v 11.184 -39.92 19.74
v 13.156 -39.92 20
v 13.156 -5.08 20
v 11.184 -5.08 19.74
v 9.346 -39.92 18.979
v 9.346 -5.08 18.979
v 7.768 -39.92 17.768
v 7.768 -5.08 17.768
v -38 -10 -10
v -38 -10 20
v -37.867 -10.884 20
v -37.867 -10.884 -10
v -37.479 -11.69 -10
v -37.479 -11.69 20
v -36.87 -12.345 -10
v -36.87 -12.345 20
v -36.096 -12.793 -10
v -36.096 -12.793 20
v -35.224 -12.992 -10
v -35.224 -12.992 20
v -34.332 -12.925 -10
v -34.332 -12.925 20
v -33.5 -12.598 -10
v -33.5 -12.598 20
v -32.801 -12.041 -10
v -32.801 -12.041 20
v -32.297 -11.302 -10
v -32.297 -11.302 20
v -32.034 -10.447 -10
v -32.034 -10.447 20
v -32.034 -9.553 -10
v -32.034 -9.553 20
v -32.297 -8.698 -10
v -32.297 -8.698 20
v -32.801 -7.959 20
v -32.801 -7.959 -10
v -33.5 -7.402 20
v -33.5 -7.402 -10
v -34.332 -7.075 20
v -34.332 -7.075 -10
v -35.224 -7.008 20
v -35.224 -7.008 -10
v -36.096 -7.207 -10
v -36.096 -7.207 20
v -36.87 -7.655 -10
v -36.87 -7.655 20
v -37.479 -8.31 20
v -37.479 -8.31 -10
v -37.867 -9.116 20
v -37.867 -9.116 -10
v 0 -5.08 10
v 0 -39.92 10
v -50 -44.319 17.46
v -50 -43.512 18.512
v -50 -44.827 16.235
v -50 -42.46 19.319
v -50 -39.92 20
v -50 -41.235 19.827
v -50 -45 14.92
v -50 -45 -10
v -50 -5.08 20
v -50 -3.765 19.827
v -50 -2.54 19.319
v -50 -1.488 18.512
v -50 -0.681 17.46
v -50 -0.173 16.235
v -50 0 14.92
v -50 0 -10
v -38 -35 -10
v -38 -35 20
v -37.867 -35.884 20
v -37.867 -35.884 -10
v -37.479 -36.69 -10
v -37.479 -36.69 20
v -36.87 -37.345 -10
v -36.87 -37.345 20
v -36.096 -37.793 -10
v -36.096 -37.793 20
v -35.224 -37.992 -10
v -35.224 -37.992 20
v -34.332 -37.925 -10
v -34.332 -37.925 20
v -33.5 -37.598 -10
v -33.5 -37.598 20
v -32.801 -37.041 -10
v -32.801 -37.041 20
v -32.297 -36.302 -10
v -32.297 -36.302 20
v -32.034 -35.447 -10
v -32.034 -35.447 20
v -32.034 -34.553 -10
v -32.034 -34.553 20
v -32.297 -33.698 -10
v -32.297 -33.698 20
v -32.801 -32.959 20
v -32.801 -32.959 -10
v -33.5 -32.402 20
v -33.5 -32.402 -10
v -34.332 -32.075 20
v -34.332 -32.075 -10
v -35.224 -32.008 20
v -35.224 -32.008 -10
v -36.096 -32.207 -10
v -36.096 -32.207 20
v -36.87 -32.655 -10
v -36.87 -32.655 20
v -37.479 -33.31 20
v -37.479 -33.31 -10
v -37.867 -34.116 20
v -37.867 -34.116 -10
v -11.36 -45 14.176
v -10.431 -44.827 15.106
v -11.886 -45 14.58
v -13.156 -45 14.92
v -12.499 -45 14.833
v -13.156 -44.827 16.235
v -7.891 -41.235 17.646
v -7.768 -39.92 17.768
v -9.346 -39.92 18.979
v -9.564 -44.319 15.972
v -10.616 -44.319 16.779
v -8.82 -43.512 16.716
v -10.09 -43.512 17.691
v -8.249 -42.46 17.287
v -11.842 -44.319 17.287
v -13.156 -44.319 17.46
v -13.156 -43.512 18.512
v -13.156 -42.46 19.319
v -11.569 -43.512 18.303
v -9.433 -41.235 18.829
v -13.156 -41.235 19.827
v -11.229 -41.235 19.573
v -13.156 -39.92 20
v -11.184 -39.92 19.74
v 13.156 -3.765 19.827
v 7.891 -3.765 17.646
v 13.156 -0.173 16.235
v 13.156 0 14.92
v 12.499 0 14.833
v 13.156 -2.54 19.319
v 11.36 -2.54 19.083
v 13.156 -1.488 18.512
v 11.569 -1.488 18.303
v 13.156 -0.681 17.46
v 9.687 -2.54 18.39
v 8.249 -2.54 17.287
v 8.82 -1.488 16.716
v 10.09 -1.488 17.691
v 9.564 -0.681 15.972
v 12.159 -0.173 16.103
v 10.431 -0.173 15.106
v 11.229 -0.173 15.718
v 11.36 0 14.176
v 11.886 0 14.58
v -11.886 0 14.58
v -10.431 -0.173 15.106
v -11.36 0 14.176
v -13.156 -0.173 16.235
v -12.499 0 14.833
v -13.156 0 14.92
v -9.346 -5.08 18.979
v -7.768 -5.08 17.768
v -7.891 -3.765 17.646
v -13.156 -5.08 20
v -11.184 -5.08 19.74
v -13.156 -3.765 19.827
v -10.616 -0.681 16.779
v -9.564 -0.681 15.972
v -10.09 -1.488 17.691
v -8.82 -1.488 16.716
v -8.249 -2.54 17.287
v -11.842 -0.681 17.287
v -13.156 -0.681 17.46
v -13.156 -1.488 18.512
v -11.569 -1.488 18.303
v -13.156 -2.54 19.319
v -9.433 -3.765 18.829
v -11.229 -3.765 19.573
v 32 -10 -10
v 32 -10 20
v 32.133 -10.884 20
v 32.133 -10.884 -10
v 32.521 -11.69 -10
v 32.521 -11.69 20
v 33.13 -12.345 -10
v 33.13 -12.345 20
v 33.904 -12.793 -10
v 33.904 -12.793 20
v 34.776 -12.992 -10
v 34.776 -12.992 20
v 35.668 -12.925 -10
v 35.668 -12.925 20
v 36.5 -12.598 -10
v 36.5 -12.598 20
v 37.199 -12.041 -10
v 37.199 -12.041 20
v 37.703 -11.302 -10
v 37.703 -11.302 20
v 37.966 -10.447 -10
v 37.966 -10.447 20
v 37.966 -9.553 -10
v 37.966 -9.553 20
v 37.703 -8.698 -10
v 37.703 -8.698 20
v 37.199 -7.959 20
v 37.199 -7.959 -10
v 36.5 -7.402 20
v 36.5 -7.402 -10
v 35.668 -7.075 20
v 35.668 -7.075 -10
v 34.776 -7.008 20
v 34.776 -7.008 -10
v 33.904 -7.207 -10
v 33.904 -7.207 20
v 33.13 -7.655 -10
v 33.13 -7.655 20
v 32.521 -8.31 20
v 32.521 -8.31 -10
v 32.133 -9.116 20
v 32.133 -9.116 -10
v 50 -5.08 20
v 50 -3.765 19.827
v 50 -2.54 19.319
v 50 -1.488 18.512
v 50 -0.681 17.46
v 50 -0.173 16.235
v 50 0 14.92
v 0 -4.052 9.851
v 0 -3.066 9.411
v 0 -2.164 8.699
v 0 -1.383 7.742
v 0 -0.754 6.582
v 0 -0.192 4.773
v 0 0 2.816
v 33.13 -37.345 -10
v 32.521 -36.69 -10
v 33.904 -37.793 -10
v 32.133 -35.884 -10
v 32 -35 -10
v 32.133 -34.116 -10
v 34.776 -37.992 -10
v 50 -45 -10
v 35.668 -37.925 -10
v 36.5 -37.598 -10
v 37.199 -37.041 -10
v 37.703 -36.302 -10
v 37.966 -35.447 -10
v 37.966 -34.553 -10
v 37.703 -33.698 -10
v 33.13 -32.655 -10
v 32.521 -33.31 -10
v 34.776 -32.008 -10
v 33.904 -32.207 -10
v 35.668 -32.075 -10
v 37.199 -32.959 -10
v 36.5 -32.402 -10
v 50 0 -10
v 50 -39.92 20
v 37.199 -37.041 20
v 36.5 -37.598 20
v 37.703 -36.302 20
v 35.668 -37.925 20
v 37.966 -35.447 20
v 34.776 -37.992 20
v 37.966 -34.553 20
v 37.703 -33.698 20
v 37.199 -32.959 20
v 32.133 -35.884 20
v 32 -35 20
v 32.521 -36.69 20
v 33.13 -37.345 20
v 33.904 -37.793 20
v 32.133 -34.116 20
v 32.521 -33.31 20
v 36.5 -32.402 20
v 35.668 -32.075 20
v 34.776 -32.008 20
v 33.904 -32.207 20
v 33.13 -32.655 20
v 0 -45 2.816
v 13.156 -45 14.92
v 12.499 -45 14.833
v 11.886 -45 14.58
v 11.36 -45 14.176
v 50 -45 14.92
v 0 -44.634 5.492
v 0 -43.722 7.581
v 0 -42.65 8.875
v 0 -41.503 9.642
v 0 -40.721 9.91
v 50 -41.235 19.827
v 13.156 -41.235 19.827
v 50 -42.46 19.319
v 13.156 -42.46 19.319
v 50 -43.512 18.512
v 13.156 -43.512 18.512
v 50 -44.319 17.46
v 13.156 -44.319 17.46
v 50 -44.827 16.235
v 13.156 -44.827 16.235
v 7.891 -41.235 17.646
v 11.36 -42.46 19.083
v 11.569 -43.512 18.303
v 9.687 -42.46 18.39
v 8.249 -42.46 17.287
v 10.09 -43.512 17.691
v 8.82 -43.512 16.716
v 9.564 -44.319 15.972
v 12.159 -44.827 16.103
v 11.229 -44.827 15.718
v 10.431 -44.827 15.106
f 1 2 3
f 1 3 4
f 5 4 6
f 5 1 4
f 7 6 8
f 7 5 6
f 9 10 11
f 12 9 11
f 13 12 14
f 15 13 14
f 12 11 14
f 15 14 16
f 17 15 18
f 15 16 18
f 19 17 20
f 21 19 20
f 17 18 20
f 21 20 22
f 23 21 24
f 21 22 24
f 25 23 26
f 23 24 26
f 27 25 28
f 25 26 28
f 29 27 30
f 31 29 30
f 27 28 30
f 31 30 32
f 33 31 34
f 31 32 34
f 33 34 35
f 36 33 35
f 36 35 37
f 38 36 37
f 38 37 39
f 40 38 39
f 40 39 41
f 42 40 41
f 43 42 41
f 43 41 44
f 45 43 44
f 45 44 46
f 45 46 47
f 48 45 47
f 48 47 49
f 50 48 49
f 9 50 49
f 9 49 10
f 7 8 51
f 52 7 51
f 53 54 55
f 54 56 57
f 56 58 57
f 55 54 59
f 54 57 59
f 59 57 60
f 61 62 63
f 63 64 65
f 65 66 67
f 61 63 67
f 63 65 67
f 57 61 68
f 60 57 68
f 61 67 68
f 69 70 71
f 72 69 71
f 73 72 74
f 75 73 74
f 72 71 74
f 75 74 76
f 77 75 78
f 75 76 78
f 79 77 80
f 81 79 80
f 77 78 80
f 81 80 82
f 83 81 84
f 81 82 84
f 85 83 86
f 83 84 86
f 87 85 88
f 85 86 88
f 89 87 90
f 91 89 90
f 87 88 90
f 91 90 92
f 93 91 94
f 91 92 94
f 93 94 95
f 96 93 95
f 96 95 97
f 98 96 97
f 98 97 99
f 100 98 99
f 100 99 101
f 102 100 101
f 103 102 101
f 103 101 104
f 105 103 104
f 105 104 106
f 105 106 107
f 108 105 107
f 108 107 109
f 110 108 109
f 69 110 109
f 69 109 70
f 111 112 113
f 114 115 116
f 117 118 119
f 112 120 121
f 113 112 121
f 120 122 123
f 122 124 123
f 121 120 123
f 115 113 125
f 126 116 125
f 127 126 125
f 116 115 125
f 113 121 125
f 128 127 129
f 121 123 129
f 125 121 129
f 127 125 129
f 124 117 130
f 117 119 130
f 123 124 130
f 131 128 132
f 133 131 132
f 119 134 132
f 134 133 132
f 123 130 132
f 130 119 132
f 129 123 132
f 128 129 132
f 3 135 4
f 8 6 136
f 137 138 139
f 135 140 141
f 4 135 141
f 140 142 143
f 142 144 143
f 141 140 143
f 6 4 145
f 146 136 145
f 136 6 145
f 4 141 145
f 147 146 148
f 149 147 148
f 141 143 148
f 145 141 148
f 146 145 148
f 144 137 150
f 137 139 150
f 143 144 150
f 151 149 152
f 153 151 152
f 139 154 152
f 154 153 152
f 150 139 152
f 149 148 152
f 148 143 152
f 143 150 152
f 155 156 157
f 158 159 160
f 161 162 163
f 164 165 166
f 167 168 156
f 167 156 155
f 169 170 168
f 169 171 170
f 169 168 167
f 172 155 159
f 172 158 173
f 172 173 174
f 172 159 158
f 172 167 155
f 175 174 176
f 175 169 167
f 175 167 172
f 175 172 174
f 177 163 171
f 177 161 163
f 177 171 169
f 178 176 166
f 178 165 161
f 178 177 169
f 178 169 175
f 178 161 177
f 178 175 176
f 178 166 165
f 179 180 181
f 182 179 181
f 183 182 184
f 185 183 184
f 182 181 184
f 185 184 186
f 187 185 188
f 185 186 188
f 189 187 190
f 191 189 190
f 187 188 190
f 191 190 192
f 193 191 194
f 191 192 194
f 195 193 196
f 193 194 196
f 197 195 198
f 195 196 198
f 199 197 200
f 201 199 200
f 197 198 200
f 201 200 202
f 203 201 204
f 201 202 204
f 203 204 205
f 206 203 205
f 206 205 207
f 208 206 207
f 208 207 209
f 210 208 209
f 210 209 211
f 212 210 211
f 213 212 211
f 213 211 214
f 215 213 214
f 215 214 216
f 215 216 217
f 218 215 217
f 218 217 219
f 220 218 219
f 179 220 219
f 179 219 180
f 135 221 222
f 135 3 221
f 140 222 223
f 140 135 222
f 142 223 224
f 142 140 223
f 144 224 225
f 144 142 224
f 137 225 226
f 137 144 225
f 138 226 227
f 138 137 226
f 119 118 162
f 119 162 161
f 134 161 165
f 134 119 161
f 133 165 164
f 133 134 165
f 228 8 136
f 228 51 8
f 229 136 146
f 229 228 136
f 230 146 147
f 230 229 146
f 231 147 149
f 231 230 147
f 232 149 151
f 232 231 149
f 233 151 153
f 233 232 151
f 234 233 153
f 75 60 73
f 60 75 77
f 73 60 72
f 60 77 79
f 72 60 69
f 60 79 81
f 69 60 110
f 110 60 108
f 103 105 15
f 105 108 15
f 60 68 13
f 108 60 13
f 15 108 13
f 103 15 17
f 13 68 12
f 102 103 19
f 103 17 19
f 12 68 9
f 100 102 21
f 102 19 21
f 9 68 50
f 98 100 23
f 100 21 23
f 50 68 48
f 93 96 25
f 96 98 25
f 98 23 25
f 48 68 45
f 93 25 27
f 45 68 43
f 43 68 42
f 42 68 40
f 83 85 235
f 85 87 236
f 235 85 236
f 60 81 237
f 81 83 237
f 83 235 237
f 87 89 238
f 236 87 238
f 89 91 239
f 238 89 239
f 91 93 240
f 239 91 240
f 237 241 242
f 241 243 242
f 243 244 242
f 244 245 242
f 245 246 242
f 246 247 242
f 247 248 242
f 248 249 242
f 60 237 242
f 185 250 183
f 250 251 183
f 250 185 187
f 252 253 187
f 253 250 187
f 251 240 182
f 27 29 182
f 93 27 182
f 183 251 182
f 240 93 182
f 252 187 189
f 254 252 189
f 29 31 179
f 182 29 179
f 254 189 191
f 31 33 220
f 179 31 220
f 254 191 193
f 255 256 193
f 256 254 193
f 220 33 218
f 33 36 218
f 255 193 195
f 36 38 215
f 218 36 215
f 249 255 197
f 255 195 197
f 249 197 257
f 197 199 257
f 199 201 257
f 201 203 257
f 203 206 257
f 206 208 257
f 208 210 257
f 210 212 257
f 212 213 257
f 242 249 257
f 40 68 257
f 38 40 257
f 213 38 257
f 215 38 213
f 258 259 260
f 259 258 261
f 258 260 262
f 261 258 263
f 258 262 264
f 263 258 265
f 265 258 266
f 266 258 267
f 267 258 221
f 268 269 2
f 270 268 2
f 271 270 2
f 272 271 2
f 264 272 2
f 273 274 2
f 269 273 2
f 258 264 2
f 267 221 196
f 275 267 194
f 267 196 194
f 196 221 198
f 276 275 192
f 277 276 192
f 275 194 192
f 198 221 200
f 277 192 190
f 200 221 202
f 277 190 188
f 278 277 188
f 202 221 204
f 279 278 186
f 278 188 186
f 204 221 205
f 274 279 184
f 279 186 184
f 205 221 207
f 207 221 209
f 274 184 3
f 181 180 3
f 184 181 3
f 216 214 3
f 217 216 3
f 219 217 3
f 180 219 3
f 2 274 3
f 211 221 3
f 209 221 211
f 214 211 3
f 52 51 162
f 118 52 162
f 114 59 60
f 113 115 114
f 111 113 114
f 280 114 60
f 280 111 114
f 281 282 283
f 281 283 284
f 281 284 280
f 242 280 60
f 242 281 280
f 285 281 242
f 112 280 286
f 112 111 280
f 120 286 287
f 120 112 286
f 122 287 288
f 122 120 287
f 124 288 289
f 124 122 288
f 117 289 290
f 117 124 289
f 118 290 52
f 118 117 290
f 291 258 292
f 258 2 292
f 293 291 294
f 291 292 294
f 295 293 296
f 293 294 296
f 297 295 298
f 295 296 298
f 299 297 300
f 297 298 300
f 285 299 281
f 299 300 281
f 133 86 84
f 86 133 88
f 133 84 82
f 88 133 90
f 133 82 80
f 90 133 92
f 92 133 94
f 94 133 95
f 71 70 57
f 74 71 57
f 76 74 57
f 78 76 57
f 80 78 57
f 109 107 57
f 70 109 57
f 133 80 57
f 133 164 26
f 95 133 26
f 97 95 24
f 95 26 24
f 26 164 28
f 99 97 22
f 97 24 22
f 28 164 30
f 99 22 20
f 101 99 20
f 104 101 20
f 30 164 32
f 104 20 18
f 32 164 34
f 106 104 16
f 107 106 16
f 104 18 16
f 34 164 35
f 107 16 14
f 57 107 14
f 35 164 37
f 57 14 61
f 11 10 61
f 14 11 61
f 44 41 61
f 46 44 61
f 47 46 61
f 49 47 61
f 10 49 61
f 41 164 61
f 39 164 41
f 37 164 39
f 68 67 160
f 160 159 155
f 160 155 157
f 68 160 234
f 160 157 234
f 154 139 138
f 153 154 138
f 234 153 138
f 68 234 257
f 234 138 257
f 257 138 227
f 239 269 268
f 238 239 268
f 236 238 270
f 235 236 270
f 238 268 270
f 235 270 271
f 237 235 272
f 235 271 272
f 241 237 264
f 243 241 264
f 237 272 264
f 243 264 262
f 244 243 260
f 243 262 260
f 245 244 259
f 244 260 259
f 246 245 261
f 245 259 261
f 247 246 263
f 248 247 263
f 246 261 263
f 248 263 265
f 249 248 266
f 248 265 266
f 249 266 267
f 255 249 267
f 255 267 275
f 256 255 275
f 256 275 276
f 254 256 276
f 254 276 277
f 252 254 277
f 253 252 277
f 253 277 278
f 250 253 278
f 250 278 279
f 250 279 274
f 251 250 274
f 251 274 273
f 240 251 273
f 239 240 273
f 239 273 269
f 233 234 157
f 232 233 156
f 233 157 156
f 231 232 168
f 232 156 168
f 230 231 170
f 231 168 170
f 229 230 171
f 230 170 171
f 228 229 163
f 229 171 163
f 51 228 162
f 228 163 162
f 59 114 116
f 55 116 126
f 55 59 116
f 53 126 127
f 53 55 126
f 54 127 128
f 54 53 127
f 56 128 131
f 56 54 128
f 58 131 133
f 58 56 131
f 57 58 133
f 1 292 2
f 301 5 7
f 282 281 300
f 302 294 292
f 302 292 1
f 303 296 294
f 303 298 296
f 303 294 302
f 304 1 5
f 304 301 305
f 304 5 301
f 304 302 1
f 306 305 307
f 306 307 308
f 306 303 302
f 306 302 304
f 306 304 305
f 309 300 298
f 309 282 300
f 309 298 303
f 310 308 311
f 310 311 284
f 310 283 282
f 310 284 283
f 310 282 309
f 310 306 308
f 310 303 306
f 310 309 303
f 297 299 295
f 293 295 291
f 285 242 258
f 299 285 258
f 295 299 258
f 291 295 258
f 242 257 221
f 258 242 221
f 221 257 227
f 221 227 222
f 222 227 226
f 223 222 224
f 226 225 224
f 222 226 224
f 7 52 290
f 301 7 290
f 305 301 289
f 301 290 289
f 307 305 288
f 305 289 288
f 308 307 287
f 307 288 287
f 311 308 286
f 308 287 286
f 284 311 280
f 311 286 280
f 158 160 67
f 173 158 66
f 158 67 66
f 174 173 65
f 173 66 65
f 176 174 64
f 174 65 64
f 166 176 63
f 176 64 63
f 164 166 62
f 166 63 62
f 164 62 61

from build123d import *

# Parameters (mm, degrees)
F1_DEPTH = 45
F2_R     = 7.62
F3_R     = 5.08
F5_D     = 6


with BuildPart() as f1:
    # F0 (on Front) → F1 (new body)
    with BuildSketch(Plane.XZ):
        Polygon((50, 20), (20, 20), (10, 20), (0, 10), (-10, 20), (-20, 20), (-50, 20), (-50, 0), (-50, -10), (50, -10), (50, 0), align=None)
    extrude(amount=F1_DEPTH)

    # F2
    f2_edges = [f1.edges().sort_by_distance(p)[0] for p in [
        (10, -22.5, 20),
        (-10, -22.5, 20),
    ]]
    fillet(f2_edges, radius=F2_R)

    # F3
    f3_edges = [f1.edges().sort_by_distance(p)[0] for p in [
        (-31.578154, -45, 20),
        (31.578154, -45, 20),
        (31.578154, 0, 20),
        (-31.578154, 0, 20),
    ]]
    fillet(f3_edges, radius=F3_R)

    # F5 (through all)
    with Locations(Plane(origin=(0, 0, -10), x_dir=(1, 0, 0), z_dir=(0, 0, -1))):
        with Locations((35, 10), (35, 35), (-35, 35), (-35, 10)):
            Hole(F5_D / 2)


solid = f1.part
